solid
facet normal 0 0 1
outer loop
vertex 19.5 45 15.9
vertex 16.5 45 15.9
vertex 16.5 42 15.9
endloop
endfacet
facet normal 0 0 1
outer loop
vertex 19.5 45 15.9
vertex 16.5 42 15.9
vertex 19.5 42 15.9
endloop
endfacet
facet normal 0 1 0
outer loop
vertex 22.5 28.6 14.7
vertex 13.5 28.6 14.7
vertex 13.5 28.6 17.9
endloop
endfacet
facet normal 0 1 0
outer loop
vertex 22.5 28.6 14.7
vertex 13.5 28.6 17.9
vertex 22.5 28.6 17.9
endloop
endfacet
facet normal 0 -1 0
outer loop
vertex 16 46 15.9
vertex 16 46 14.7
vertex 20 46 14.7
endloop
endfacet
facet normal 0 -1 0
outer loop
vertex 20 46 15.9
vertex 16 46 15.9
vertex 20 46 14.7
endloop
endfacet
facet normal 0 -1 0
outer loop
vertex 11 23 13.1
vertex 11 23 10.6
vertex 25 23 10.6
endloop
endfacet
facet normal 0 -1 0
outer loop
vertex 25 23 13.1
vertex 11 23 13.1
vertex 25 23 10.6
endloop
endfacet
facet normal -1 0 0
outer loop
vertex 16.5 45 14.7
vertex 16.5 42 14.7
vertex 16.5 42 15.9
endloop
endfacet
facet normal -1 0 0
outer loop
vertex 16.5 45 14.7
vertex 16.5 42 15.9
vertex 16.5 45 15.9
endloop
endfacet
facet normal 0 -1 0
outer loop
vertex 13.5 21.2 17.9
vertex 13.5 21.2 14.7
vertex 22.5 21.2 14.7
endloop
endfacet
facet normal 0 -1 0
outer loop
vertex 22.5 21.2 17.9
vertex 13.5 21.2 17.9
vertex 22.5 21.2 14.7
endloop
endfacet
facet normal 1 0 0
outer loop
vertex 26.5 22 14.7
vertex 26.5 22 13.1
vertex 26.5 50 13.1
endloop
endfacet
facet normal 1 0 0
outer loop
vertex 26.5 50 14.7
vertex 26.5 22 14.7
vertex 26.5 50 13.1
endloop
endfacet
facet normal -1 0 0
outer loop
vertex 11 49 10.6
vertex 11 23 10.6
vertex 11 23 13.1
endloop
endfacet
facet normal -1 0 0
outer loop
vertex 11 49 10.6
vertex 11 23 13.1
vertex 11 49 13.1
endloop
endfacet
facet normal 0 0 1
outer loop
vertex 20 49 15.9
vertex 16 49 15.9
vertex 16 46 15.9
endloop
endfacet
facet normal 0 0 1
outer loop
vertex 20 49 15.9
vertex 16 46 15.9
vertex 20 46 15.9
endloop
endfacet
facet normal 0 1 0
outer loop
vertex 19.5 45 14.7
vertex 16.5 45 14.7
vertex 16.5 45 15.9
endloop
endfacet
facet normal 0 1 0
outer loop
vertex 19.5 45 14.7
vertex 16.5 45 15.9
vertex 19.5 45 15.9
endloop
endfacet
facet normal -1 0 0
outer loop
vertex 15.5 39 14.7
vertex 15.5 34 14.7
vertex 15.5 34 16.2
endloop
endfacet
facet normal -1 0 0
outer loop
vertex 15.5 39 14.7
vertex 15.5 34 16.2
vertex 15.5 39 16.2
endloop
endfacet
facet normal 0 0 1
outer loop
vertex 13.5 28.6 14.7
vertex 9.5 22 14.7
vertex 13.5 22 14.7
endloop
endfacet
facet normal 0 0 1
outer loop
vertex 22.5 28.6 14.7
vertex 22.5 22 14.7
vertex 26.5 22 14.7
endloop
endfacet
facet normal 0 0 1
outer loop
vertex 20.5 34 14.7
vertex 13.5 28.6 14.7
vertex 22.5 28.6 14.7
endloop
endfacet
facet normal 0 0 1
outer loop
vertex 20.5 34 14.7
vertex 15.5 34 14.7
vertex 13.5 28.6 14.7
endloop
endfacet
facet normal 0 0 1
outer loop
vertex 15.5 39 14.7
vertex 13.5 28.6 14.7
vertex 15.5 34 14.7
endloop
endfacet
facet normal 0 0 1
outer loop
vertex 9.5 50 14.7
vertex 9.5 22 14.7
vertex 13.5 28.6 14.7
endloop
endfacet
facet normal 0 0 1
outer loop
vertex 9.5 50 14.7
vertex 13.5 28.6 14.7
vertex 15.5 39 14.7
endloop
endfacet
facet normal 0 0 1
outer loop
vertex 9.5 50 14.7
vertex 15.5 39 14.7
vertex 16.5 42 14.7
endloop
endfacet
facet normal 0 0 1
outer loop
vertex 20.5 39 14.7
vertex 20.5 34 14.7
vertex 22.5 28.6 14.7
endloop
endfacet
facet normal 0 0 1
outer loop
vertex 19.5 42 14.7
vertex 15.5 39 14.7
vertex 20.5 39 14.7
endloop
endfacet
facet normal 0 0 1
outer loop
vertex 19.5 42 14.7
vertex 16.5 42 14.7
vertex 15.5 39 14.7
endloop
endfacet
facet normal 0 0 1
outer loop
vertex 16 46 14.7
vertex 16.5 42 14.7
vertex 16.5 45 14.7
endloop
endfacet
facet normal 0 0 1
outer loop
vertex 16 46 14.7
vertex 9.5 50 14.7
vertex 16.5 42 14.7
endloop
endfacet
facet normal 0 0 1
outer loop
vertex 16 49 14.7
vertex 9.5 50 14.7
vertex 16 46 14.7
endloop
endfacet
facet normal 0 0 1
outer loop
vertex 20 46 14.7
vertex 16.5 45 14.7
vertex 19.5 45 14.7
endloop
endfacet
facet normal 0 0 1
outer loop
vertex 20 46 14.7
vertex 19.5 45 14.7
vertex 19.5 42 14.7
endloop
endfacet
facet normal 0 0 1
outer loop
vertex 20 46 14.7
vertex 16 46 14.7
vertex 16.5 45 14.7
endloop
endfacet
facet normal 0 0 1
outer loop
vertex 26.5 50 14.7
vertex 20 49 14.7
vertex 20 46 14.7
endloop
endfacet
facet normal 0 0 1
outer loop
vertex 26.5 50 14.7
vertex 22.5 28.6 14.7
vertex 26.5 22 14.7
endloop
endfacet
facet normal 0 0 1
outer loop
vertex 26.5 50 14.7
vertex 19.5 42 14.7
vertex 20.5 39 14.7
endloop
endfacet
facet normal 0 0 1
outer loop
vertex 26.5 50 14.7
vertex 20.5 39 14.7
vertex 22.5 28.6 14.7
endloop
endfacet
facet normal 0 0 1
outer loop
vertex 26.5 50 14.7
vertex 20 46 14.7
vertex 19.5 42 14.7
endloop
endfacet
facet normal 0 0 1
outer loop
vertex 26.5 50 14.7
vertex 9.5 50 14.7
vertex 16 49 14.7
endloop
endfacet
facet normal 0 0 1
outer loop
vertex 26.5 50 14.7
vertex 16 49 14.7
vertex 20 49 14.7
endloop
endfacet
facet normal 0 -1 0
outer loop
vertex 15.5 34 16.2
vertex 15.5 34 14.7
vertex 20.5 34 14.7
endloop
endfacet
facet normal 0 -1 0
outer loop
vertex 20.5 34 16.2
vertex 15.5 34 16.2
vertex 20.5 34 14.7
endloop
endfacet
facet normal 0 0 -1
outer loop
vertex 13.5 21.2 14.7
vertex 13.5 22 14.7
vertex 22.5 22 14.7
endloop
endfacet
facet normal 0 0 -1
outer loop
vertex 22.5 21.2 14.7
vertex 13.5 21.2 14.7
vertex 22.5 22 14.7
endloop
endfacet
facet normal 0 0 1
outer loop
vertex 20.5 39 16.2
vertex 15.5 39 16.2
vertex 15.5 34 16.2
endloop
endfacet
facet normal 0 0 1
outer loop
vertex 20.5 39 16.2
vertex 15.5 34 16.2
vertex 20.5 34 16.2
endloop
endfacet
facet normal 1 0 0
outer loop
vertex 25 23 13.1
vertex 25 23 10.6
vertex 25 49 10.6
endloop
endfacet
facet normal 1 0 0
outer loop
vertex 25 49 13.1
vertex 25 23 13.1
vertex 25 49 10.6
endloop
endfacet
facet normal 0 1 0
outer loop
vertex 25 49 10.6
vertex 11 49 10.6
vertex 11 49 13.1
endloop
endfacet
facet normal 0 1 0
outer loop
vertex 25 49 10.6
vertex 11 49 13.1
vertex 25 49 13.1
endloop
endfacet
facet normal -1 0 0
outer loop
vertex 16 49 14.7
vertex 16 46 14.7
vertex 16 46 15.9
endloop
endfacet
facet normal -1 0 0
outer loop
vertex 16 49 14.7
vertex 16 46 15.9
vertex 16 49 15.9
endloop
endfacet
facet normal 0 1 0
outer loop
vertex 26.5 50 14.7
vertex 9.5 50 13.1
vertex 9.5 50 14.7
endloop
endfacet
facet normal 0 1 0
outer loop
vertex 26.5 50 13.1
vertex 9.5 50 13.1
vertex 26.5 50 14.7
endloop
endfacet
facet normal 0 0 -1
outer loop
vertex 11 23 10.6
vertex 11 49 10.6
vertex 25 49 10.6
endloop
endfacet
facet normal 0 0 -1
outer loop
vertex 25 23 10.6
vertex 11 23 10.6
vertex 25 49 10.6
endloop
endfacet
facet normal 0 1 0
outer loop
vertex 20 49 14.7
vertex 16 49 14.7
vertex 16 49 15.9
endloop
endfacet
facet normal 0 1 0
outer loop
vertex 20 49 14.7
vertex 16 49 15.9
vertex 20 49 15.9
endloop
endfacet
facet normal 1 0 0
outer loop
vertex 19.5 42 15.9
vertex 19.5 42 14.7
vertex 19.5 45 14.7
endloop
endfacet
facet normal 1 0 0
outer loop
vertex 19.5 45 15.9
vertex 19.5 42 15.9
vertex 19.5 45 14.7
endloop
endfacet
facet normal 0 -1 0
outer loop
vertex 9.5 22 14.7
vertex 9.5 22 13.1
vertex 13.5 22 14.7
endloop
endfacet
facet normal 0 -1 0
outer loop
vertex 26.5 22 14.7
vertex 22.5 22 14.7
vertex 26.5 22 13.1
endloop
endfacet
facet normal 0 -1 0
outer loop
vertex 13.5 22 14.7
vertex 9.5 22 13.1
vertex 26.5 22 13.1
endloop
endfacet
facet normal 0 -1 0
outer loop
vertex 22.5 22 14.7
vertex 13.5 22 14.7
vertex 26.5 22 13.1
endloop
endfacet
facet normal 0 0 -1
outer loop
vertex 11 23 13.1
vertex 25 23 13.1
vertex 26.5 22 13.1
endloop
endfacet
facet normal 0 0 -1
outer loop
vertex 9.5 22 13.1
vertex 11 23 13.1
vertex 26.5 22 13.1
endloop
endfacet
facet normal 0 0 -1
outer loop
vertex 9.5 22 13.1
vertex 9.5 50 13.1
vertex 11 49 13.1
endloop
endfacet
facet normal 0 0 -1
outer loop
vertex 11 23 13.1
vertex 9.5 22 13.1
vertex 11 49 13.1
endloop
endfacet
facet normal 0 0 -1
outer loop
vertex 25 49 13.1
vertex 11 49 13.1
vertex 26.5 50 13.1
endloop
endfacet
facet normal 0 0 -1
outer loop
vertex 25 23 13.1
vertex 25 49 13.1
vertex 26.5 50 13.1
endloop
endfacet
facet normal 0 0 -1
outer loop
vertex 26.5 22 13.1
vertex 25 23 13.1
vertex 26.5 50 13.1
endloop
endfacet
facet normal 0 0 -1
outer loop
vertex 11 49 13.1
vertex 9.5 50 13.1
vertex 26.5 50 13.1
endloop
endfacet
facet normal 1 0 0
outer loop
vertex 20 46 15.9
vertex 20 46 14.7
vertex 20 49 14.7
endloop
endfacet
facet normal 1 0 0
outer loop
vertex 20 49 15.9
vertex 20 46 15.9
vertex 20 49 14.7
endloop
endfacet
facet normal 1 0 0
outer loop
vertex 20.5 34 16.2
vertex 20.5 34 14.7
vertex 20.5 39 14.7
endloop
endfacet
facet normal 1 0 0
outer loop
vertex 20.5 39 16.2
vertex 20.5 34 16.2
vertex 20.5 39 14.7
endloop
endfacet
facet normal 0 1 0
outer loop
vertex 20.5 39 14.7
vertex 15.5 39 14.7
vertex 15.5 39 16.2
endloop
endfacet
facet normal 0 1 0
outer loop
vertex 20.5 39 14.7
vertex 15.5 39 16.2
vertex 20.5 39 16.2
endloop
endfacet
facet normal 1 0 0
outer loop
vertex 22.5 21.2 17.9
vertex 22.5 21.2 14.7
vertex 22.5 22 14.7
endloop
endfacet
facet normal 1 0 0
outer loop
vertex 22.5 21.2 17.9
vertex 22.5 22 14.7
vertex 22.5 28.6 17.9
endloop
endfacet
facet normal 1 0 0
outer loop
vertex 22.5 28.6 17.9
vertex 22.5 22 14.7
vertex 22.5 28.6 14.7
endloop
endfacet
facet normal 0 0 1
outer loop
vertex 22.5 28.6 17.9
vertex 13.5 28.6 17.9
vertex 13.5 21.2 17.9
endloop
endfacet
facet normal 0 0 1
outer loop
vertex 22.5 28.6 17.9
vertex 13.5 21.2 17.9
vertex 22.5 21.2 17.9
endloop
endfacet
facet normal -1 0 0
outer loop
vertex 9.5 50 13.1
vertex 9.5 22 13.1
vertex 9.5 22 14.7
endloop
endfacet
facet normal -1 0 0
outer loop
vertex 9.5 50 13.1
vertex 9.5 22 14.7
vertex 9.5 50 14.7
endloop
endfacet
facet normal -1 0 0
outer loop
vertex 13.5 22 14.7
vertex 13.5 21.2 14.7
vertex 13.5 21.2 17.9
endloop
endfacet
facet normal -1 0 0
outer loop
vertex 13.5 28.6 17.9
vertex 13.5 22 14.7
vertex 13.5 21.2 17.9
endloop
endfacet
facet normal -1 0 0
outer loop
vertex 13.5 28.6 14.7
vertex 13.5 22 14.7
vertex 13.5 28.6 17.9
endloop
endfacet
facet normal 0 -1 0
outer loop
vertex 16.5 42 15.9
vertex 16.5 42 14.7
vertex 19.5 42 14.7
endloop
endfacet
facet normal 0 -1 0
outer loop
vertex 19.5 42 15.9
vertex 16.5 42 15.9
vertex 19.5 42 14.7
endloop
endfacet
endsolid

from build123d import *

# Parameters (mm, degrees)
SKETCH1_W           = 14
SKETCH1_H           = 26
BOSS_EXTRUDE1_DEPTH = 2.5
SKETCH2_W           = 17
SKETCH2_H           = 28
BOSS_EXTRUDE2_DEPTH = 1.6
SKETCH3_W           = 9
SKETCH3_H           = 7.4
BOSS_EXTRUDE3_DEPTH = 3.2
SKETCH4_W           = 5
SKETCH4_H           = 5
BOSS_EXTRUDE4_DEPTH = 1.5
SKETCH5_W           = 3
SKETCH5_H           = 3
BOSS_EXTRUDE5_DEPTH = 1.2
SKETCH6_W           = 4
SKETCH6_H           = 3
BOSS_EXTRUDE6_DEPTH = 1.2


with BuildPart() as part:
    # Sketch1 → Boss-Extrude1 (new body)
    with BuildSketch(Plane.XY.offset(10.6)):
        with Locations((18, 36)):
            Rectangle(SKETCH1_W, SKETCH1_H)
    extrude(amount=BOSS_EXTRUDE1_DEPTH)

    # Sketch2 → Boss-Extrude2 (add)
    with BuildSketch(Plane.XY.offset(13.1)):
        with Locations((18, 36)):
            Rectangle(SKETCH2_W, SKETCH2_H)
    extrude(amount=BOSS_EXTRUDE2_DEPTH)

    # Sketch3 → Boss-Extrude3 (add)
    with BuildSketch(Plane.XY.offset(14.7)):
        with Locations((18, 24.9)):
            Rectangle(SKETCH3_W, SKETCH3_H)
    extrude(amount=BOSS_EXTRUDE3_DEPTH)

    # Sketch4 → Boss-Extrude4 (add)
    with BuildSketch(Plane.XY.offset(14.7)):
        with Locations((18, 36.5)):
            Rectangle(SKETCH4_W, SKETCH4_H)
    extrude(amount=BOSS_EXTRUDE4_DEPTH)

    # Sketch5 → Boss-Extrude5 (add)
    with BuildSketch(Plane.XY.offset(14.7)):
        with Locations((18, 43.5)):
            Rectangle(SKETCH5_W, SKETCH5_H)
    extrude(amount=BOSS_EXTRUDE5_DEPTH)

    # Sketch6 → Boss-Extrude6 (add)
    with BuildSketch(Plane.XY.offset(14.7)):
        with Locations((18, 47.5)):
            Rectangle(SKETCH6_W, SKETCH6_H)
    extrude(amount=BOSS_EXTRUDE6_DEPTH)


solid = part.part
